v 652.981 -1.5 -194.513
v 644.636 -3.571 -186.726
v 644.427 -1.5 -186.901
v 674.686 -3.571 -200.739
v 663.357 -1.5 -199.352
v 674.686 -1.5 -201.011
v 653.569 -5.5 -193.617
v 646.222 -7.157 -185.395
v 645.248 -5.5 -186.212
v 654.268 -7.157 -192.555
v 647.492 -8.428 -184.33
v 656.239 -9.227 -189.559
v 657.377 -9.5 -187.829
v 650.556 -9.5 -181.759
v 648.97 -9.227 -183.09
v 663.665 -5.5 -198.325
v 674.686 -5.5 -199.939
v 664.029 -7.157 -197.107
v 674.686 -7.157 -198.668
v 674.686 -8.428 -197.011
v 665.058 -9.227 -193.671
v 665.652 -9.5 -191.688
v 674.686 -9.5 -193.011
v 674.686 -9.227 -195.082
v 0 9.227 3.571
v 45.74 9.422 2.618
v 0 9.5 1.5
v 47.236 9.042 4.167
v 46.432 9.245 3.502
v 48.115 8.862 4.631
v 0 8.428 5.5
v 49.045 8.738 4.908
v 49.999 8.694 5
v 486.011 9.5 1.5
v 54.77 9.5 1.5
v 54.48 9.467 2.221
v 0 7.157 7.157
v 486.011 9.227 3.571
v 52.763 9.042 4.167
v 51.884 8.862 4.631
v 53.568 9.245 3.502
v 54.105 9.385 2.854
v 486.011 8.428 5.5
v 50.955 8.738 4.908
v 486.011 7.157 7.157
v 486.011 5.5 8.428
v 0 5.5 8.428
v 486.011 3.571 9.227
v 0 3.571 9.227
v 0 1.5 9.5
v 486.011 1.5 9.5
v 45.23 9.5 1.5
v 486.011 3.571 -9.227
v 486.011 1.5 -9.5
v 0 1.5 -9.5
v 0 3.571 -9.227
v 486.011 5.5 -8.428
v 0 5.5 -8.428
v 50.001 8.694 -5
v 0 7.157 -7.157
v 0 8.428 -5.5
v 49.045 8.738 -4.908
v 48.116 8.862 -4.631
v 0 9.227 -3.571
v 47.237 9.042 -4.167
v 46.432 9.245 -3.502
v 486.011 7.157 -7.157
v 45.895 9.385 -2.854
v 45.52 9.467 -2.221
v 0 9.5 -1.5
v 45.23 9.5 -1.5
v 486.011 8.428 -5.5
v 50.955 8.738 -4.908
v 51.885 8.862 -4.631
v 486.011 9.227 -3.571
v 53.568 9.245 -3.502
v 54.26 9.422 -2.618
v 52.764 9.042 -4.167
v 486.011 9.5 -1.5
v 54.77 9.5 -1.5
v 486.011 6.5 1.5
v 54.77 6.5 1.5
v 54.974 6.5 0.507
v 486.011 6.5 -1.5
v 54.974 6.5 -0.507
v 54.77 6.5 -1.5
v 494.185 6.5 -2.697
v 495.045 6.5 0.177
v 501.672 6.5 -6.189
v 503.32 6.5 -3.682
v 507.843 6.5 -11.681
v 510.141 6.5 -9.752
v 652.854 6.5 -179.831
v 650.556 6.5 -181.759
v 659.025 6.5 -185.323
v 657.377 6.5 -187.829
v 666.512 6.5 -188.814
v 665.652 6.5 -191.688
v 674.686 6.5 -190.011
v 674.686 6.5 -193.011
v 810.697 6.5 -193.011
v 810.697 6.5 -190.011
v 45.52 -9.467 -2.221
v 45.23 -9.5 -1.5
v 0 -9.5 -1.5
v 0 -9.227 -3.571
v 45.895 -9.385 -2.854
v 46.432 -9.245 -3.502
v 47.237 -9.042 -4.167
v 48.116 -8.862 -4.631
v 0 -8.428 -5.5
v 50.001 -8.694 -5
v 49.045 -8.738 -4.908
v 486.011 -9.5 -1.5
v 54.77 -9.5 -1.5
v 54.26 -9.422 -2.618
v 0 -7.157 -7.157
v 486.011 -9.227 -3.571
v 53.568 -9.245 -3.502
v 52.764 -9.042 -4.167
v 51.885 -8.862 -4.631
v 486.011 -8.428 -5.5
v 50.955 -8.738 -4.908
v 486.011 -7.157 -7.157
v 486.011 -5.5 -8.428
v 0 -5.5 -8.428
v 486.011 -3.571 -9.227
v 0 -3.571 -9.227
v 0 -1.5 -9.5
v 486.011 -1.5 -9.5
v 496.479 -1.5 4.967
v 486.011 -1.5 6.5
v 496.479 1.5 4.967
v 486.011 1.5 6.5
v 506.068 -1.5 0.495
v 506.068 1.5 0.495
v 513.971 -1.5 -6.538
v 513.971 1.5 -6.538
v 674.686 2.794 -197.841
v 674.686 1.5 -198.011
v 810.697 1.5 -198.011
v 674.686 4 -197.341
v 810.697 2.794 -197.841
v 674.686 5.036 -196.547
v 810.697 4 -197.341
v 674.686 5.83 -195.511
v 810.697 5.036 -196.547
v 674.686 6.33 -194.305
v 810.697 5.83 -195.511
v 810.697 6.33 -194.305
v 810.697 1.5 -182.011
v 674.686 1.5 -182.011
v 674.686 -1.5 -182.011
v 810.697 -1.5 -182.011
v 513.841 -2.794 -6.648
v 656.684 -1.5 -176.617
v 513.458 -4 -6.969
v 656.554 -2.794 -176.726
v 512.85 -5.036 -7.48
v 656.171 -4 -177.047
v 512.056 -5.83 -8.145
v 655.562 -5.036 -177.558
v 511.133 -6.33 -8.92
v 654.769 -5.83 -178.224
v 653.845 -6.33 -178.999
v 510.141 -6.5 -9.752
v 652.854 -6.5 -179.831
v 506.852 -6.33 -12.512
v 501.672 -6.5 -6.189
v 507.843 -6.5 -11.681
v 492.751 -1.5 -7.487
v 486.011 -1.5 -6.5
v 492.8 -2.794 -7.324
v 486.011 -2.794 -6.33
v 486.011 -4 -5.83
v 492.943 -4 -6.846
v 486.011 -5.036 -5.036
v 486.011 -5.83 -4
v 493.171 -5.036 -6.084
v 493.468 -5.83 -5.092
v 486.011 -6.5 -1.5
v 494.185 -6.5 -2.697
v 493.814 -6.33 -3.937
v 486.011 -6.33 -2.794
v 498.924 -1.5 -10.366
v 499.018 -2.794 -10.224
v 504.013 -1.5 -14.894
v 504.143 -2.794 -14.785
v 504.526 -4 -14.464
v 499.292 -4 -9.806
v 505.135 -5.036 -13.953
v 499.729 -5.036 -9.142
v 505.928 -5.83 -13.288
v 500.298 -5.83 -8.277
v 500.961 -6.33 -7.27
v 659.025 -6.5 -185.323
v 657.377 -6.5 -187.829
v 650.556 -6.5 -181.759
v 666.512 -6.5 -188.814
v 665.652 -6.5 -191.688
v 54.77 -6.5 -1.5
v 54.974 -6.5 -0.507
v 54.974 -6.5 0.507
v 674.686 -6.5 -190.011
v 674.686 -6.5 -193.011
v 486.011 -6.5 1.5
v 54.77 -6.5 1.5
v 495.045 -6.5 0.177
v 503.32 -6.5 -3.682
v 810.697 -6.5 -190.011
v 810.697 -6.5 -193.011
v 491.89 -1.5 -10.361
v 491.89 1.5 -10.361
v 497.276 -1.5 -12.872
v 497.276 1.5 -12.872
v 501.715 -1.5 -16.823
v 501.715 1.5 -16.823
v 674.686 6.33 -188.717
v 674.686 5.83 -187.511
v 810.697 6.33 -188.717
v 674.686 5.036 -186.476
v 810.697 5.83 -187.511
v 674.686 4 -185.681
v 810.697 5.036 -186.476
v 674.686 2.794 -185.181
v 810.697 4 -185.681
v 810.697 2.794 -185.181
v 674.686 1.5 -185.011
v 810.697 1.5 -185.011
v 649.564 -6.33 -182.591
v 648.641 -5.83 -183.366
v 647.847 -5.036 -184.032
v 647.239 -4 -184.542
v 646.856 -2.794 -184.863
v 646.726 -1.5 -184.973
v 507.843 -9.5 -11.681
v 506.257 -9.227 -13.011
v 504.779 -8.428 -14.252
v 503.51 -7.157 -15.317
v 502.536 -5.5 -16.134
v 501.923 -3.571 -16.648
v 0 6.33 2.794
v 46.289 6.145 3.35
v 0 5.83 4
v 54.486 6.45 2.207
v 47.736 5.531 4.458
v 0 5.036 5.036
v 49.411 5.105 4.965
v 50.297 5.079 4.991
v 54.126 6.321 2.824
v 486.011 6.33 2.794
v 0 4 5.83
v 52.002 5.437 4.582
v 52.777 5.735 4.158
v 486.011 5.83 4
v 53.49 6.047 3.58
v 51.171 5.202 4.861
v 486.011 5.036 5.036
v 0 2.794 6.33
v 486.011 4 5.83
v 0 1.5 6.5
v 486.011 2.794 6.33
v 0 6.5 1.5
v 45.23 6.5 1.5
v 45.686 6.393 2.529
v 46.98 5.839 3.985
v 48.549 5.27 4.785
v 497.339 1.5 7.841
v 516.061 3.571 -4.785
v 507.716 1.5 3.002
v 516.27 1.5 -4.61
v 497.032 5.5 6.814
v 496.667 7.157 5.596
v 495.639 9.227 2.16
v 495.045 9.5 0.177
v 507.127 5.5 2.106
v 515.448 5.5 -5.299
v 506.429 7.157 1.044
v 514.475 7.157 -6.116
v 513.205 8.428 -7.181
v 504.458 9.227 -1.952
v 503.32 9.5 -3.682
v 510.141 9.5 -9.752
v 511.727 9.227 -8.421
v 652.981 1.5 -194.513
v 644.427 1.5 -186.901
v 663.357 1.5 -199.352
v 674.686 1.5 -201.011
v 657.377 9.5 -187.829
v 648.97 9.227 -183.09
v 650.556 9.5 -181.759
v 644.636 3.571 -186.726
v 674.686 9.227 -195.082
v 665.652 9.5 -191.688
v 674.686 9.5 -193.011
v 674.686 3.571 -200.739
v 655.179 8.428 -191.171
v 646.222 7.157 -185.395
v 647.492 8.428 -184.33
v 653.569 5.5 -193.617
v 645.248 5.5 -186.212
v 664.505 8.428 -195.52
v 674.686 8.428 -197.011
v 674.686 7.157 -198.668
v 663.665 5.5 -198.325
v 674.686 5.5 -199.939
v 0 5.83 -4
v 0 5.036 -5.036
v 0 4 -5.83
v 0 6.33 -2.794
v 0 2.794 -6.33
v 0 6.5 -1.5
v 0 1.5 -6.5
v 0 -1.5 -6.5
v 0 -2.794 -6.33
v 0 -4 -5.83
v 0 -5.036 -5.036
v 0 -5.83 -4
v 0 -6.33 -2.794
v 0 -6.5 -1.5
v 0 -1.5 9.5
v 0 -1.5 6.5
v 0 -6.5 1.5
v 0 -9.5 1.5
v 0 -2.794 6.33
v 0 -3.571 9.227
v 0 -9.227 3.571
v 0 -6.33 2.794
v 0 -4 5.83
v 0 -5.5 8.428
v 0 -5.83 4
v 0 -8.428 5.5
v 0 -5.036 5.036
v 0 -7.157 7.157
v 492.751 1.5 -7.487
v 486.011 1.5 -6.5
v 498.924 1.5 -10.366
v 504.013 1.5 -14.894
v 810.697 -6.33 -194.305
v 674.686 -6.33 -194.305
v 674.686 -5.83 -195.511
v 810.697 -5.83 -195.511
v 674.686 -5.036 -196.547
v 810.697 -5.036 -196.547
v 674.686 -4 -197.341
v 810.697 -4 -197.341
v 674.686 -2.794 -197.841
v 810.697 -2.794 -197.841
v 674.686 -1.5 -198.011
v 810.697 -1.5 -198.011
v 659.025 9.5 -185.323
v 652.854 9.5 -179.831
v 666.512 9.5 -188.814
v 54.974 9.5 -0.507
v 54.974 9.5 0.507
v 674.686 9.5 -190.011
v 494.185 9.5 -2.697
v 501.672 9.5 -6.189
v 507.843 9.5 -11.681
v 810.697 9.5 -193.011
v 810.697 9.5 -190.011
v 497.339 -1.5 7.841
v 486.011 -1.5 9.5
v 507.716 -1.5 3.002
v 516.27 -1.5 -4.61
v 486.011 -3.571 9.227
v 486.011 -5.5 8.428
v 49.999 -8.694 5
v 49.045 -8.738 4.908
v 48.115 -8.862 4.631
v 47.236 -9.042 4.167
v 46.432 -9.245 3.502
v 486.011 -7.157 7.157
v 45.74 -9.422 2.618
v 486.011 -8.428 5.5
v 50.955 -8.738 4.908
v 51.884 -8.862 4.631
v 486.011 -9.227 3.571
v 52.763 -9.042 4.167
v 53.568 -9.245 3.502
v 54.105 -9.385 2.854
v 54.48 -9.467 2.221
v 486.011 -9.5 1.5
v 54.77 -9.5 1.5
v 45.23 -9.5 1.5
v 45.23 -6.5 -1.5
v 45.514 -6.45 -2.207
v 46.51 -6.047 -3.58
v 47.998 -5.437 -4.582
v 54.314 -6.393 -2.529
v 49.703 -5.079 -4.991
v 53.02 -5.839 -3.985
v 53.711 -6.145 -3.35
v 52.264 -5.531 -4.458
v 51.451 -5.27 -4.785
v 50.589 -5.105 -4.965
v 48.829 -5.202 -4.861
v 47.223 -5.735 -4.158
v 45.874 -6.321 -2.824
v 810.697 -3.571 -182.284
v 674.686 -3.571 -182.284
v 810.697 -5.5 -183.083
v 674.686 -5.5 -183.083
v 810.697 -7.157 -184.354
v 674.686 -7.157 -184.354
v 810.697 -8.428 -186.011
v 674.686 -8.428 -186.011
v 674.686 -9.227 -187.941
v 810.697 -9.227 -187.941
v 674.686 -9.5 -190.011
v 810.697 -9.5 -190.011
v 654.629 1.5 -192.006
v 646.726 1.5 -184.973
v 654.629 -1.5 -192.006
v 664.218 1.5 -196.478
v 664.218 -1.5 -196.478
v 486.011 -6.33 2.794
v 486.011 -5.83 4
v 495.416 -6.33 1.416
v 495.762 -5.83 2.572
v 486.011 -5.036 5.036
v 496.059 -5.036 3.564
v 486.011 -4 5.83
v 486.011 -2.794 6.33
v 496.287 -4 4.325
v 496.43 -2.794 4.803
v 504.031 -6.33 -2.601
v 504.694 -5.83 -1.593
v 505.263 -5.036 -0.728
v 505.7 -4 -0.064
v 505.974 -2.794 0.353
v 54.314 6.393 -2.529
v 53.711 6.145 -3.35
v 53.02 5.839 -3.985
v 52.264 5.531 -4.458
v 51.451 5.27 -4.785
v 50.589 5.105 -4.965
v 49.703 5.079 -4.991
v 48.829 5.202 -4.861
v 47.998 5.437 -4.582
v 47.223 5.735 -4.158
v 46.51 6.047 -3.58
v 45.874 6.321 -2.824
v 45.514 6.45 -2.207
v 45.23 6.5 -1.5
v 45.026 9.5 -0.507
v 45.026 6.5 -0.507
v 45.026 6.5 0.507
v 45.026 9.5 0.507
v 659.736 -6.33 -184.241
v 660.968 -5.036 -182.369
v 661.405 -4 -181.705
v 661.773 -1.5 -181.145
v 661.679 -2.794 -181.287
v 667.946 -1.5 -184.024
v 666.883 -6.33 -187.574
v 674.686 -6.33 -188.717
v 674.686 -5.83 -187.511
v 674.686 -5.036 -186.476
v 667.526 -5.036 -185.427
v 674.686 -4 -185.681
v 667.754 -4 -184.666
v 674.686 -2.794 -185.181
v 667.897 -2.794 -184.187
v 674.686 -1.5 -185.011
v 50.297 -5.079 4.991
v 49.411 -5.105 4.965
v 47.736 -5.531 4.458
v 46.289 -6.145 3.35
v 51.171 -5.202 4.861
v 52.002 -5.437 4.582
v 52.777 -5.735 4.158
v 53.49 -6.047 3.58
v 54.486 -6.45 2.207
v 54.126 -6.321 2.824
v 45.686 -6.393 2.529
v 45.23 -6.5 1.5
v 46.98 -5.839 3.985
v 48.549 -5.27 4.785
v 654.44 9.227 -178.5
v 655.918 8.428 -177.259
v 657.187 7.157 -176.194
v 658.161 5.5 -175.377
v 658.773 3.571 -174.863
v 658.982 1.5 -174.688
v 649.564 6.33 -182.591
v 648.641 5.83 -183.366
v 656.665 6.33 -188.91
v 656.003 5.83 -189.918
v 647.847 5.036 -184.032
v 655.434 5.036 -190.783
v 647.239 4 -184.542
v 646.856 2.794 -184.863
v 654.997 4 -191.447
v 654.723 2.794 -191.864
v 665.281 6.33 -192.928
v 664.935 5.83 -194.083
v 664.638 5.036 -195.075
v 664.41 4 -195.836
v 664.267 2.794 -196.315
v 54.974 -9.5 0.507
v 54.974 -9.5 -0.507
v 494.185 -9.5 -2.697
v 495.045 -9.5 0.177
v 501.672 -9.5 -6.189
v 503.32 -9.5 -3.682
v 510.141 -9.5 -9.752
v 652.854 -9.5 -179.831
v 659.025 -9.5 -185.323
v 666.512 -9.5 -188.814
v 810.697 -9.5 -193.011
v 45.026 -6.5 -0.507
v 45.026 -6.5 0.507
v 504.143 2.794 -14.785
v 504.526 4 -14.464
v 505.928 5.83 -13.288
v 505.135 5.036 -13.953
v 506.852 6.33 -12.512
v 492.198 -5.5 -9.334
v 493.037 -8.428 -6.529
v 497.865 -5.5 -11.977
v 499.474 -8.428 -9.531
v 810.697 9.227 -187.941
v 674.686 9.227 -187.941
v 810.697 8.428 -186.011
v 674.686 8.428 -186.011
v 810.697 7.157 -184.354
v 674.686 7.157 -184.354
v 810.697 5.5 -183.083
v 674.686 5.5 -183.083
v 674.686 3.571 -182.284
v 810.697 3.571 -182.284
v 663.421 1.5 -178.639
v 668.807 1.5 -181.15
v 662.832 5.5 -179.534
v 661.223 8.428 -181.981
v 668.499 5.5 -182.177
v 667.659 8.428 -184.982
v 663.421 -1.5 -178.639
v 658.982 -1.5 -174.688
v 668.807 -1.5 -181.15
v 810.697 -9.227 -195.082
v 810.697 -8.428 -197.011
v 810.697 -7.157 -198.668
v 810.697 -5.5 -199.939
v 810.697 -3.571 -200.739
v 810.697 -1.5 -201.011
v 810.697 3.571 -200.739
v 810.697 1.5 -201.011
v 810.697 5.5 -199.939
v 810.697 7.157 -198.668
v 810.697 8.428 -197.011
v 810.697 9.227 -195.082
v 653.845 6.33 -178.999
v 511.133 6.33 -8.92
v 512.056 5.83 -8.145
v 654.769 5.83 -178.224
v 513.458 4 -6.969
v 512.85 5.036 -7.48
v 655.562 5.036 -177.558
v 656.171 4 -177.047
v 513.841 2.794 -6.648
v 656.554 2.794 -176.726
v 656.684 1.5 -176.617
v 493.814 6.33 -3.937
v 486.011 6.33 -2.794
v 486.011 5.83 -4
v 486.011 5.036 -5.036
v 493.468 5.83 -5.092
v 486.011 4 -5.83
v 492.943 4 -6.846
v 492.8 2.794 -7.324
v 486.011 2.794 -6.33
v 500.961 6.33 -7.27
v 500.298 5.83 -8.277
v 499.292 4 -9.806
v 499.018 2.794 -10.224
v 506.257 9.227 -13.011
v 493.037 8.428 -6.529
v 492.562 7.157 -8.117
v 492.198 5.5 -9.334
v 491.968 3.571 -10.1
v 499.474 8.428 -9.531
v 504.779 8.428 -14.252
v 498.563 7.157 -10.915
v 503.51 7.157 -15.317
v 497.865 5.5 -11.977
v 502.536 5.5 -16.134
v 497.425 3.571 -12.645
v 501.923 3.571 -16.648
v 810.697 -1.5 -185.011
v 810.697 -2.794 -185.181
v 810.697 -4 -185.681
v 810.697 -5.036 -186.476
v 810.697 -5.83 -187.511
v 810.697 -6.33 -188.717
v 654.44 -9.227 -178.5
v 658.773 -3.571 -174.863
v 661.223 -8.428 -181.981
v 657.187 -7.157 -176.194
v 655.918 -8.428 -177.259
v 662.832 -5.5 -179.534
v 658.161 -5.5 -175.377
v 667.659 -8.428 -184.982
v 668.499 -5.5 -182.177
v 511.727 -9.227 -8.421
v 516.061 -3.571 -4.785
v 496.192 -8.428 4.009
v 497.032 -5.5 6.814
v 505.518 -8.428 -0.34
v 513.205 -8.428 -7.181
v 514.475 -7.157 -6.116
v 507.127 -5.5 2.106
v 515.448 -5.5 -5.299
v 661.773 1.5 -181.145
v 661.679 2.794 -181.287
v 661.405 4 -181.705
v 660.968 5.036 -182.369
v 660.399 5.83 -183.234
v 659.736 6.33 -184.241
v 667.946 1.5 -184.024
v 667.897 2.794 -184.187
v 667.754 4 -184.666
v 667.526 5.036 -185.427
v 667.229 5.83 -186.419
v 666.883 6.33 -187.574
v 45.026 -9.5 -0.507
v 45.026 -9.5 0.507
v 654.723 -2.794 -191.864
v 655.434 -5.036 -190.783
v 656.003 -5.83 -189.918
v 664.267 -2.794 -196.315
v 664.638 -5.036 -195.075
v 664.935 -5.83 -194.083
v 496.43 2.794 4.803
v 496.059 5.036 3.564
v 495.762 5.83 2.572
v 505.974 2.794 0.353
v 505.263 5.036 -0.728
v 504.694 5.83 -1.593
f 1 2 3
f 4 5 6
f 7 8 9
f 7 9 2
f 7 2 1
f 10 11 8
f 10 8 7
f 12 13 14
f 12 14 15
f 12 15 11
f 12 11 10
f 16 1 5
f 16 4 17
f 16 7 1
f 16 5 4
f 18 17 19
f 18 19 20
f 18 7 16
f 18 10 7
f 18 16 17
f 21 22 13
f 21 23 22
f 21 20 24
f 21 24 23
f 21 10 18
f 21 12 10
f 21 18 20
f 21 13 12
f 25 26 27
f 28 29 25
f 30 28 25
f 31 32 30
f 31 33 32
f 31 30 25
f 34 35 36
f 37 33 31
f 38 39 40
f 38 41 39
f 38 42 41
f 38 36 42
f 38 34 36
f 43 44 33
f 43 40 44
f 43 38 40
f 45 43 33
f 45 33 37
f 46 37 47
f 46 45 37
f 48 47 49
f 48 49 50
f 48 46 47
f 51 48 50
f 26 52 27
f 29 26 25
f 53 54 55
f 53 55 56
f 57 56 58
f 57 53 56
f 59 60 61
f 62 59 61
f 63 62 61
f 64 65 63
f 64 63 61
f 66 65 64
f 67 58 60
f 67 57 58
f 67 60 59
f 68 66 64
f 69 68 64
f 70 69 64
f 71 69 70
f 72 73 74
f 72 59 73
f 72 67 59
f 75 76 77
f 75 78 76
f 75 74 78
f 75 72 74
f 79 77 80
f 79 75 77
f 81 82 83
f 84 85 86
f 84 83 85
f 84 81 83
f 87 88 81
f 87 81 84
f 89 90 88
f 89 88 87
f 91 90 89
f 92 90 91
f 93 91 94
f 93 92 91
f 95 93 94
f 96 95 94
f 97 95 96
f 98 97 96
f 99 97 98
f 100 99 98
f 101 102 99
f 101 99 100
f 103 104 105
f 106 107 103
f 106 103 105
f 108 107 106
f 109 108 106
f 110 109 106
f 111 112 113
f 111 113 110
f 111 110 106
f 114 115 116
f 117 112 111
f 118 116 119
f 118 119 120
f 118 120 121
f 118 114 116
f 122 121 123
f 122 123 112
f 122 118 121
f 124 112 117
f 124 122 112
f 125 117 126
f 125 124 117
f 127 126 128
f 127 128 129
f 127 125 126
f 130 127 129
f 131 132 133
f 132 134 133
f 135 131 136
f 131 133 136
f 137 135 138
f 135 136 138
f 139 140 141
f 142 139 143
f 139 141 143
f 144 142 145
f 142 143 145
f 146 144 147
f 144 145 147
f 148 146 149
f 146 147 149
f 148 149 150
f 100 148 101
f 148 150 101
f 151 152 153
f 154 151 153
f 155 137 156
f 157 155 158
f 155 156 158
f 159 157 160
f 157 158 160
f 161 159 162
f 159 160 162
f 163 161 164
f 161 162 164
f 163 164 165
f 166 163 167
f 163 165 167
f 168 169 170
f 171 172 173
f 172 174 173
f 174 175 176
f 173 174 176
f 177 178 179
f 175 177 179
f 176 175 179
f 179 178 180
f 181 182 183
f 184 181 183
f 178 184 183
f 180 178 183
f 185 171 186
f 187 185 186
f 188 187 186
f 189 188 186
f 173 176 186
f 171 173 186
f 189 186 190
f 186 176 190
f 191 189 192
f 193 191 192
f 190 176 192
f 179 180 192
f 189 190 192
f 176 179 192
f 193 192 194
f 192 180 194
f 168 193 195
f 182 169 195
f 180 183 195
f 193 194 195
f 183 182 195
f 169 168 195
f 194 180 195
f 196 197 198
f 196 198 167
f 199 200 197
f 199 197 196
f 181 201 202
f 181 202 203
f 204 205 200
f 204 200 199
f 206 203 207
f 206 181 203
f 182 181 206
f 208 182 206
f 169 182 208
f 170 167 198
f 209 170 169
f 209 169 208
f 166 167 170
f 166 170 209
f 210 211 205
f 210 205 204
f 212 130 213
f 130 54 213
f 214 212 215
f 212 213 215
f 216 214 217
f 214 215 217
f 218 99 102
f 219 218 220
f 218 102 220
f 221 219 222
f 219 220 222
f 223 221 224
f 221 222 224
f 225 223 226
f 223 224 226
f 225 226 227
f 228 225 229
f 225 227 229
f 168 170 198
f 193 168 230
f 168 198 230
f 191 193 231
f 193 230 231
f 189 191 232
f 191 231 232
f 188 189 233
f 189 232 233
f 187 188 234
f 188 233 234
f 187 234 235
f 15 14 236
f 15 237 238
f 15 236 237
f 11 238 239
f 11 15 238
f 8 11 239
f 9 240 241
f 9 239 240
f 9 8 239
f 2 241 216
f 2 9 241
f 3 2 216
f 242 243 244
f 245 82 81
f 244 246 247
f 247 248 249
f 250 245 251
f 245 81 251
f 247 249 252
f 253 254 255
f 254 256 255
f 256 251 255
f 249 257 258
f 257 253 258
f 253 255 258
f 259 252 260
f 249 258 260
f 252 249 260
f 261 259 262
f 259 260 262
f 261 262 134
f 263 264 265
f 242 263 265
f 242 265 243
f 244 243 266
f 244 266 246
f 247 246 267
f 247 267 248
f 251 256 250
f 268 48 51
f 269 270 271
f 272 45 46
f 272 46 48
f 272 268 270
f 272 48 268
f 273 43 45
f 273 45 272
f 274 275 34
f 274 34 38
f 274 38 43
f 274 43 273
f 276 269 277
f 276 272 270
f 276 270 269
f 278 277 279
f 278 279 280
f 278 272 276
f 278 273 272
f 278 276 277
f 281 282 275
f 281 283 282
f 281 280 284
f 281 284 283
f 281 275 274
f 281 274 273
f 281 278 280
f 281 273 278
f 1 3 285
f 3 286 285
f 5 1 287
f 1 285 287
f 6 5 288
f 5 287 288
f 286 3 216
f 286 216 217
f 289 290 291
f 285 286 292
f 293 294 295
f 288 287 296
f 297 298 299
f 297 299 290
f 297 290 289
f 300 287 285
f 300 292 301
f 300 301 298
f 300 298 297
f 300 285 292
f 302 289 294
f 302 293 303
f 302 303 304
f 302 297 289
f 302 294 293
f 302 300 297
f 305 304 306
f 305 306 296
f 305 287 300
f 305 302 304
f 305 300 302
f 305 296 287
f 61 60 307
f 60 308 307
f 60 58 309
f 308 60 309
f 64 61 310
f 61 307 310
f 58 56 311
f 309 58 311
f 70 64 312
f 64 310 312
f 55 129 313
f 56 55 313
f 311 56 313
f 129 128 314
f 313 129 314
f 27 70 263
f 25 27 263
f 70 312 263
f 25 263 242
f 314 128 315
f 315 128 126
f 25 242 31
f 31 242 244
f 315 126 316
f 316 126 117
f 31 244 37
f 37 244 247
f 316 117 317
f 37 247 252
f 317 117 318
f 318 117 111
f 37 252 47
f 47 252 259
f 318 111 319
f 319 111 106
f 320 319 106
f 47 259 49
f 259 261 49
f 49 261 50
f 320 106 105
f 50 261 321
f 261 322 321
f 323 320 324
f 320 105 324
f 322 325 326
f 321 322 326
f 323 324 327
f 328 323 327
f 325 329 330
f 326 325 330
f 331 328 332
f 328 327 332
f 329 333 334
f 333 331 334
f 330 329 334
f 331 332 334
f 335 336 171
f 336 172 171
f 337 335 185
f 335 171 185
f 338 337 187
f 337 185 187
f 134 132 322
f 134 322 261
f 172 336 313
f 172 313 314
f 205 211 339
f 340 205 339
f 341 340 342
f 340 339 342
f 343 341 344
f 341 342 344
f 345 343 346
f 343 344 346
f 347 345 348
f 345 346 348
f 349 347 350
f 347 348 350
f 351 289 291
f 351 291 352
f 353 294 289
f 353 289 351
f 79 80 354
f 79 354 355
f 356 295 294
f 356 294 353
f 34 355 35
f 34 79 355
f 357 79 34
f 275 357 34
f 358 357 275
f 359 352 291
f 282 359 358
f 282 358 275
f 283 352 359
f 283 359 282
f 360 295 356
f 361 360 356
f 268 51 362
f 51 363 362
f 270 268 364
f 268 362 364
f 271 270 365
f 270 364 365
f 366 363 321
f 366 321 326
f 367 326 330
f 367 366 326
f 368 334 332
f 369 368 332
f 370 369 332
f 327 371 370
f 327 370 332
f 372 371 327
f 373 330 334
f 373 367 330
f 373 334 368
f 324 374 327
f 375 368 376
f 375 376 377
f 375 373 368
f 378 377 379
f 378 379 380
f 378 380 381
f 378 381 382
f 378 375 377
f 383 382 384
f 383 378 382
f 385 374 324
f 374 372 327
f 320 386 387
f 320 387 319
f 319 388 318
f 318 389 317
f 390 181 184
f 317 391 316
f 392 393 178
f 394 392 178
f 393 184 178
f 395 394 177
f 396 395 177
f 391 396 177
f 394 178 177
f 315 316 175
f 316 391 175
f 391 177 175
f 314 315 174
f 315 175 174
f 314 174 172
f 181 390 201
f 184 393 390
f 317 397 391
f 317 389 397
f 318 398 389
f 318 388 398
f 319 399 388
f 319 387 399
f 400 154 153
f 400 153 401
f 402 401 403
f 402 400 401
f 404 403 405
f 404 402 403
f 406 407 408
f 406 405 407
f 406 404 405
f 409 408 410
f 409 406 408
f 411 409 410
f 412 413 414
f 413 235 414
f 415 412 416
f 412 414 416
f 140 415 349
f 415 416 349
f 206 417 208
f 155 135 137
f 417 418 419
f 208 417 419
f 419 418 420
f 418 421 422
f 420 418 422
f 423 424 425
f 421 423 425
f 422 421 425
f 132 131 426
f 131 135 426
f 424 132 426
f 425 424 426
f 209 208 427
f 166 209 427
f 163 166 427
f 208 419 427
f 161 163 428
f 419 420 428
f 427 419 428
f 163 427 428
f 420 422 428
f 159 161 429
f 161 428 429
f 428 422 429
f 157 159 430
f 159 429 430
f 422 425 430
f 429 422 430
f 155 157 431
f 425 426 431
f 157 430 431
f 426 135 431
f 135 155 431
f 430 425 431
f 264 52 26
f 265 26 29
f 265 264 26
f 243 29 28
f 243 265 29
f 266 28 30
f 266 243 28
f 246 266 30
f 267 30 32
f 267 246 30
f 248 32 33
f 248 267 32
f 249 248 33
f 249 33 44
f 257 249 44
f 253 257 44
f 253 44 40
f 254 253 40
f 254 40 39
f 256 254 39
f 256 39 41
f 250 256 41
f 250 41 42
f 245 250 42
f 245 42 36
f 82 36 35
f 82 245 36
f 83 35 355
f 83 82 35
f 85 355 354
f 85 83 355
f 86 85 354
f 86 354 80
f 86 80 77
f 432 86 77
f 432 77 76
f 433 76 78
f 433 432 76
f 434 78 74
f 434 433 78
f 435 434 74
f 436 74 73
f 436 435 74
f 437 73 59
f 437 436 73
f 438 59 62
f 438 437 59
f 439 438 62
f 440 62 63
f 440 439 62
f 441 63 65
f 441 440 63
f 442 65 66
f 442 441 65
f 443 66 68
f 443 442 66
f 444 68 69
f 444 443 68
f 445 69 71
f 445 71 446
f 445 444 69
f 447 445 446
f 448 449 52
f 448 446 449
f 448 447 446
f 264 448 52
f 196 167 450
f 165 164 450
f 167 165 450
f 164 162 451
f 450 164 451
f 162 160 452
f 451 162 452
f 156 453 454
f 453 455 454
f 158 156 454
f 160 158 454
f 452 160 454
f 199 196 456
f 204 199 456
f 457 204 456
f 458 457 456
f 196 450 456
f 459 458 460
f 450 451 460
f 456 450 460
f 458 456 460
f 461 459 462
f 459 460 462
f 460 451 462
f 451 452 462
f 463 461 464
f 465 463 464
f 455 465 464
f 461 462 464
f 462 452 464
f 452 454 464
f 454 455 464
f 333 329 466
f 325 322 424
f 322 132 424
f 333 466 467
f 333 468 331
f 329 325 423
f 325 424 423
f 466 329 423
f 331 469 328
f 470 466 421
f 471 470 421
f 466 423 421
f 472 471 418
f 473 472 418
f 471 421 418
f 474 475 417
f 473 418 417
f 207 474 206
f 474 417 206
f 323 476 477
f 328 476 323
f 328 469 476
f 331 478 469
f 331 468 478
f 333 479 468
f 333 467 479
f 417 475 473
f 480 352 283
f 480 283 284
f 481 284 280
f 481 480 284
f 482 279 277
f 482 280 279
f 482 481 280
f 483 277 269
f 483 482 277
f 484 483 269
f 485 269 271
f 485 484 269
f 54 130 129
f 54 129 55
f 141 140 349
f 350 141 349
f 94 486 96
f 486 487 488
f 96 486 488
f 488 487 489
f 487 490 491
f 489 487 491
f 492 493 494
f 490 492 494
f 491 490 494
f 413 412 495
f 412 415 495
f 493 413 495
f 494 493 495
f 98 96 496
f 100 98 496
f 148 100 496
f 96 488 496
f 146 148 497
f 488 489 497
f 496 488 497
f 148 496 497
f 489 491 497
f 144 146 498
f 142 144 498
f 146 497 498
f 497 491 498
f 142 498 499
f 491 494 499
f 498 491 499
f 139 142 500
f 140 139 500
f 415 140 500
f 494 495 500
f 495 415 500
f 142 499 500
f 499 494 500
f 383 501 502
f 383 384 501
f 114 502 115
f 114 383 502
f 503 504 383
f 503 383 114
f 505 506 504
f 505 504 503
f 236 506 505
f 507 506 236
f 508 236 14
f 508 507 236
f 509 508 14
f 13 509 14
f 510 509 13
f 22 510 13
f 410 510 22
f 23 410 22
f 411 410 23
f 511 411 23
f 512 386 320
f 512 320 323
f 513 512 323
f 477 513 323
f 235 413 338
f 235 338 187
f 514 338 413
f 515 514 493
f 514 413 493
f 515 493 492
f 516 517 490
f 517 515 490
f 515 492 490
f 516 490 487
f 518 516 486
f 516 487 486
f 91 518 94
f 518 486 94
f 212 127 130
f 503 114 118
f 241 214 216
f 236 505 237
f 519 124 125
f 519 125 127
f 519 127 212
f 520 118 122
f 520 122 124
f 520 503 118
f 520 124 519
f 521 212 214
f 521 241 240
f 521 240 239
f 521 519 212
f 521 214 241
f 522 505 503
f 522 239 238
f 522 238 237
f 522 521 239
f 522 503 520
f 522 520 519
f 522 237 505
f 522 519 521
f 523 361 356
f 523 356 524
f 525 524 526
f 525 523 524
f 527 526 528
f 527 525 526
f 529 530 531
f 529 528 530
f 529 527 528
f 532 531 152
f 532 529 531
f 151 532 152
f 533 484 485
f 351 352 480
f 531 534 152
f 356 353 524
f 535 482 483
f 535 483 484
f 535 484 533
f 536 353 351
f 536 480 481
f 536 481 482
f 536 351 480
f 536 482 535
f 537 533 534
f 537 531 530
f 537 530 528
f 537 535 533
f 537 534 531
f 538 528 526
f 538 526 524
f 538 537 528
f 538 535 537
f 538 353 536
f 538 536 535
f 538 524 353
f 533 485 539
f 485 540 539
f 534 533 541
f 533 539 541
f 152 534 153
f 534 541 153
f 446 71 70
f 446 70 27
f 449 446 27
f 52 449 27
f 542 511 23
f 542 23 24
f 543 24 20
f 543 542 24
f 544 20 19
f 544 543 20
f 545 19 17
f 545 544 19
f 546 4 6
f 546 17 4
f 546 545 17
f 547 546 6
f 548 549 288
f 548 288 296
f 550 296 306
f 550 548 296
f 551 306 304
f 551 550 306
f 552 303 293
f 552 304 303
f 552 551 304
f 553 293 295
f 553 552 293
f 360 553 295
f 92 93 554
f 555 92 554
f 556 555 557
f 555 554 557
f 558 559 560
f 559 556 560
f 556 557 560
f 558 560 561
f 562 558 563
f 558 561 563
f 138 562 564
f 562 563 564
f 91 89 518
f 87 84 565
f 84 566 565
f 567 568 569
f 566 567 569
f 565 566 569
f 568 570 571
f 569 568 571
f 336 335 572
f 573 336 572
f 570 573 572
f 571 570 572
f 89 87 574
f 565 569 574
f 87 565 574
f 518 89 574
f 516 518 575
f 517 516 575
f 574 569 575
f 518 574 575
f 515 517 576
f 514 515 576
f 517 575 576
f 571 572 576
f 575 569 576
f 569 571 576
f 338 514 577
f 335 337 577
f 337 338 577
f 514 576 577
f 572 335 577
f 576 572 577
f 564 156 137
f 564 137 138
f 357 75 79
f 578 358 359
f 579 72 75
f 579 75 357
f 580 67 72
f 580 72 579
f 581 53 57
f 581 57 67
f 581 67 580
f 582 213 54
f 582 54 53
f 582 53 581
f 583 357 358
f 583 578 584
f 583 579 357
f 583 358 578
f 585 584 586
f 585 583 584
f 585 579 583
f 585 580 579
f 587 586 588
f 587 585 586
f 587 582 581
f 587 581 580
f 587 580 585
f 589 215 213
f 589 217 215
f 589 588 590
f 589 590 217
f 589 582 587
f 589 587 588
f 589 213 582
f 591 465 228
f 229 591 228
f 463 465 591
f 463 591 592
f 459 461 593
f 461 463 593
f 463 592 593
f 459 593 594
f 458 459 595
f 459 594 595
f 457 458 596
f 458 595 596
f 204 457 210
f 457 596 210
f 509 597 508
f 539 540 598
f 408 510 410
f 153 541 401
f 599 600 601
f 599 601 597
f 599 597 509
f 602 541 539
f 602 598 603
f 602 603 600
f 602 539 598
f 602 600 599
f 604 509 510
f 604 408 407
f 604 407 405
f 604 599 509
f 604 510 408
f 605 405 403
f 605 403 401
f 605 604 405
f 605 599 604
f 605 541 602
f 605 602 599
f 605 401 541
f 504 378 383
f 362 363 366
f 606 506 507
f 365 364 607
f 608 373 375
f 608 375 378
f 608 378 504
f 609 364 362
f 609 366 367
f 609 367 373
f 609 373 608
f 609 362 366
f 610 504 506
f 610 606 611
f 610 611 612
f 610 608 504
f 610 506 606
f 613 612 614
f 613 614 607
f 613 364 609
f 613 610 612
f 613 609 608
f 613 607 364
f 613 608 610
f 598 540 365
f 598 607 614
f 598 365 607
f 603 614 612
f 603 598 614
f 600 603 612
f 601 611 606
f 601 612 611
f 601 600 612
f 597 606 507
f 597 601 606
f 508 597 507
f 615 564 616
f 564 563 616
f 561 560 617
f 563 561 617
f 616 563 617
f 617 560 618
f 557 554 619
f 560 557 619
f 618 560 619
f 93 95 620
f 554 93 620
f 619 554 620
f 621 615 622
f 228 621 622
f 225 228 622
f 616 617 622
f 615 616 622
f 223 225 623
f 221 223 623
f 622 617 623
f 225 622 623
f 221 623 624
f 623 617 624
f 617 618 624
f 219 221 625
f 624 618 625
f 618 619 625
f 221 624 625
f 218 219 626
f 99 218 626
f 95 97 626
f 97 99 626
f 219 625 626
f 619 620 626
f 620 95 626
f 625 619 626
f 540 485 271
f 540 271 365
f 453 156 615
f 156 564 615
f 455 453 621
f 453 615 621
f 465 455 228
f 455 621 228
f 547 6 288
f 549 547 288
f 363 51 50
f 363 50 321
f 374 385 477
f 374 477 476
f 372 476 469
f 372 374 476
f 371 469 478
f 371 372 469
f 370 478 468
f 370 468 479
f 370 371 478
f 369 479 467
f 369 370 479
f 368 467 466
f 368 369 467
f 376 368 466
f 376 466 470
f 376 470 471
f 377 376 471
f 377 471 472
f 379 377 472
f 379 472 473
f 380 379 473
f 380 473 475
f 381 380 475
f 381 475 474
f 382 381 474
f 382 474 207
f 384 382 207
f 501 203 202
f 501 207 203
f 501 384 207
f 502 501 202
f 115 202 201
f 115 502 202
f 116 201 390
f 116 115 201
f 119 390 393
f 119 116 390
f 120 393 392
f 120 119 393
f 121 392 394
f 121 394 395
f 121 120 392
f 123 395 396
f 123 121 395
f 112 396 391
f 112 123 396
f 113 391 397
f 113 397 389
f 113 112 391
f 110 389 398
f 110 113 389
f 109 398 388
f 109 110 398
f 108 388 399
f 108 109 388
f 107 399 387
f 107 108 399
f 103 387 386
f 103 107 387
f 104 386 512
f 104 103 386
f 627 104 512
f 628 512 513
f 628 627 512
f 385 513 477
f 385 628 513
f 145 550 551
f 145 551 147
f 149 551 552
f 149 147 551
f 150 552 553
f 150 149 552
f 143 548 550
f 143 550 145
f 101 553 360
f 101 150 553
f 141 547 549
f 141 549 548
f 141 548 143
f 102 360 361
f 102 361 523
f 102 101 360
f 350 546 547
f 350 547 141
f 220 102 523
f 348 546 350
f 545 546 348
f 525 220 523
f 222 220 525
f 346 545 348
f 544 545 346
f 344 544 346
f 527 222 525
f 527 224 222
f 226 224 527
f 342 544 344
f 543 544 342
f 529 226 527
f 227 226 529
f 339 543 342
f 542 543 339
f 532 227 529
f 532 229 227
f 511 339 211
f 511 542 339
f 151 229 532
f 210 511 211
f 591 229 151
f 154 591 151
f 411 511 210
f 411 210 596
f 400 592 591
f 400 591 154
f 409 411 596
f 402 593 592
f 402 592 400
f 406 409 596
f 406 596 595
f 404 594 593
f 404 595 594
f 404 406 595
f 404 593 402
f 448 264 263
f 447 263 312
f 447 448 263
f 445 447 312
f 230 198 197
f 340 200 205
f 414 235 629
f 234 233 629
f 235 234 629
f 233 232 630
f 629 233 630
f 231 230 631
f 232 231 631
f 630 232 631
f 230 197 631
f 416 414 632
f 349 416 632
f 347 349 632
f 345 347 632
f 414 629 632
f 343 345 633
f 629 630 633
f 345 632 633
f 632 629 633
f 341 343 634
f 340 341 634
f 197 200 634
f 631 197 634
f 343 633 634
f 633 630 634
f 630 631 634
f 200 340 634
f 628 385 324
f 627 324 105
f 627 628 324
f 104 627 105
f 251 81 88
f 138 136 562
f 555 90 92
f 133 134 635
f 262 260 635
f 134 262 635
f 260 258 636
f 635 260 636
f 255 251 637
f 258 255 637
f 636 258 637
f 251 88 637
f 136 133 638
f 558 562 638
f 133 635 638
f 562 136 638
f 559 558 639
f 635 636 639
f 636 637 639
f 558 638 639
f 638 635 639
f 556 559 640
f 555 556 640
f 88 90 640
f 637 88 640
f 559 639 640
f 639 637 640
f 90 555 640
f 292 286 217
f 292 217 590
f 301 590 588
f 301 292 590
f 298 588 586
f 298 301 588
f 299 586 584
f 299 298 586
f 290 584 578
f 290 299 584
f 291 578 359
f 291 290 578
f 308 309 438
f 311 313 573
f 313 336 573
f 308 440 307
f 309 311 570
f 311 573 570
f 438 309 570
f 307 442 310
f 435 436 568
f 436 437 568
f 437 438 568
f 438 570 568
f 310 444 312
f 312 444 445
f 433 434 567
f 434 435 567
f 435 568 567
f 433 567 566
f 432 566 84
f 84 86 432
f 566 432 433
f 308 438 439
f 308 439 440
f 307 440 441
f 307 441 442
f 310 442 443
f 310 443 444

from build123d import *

# Parameters (mm, degrees)
CUT_EXTRUDE3_DEPTH      = 836.299457856
CUT_EXTRUDE3_DEPTH_BACK = 836.299457856
SKETCH21_R              = 5


with BuildPart() as part:
    # Sweep-Thin3: sweep along a curve in space
    with BuildLine() as sweep_thin3_path:
        Line((674.686132166, 0, -191.51111078), (810.696902422, 0, -191.51111078))
        ThreePointArc((651.704798873, 0, -180.79473907), (662.007584314, 0, -188.700344391), (674.686132166, 0, -191.51111078))
        Line((508.992103549, 0, -10.716371709), (651.704798873, 0, -180.79473907))
        ThreePointArc((486.010770255, 0, 0), (498.689318108, 0, -2.810766389), (508.992103549, 0, -10.716371709))
        Line((0, 0, 0), (486.010770255, 0, 0))
    # Sketch2 → Sweep-Thin3 (sweep)
    with BuildSketch(Plane(origin=(0, 0, 0), x_dir=(0, 0, -1), z_dir=(1, 0, 0))):
        with BuildLine():
            Line((1.5, 9.5), (-1.5, 9.5))
            ThreePointArc((-1.5, 9.5), (-7.156854249, 7.156854249), (-9.5, 1.5))
            Line((-9.5, 1.5), (-9.5, -1.5))
            ThreePointArc((-9.5, -1.5), (-7.156854249, -7.156854249), (-1.5, -9.5))
            Line((-1.5, -9.5), (1.5, -9.5))
            ThreePointArc((1.5, -9.5), (7.156854249, -7.156854249), (9.5, -1.5))
            Line((9.5, -1.5), (9.5, 1.5))
            ThreePointArc((9.5, 1.5), (7.156854249, 7.156854249), (1.5, 9.5))
        make_face()
        with BuildLine():
            Line((1.5, 6.5), (-1.5, 6.5))
            ThreePointArc((-1.5, 6.5), (-5.035533906, 5.035533906), (-6.5, 1.5))
            Line((-6.5, 1.5), (-6.5, -1.5))
            ThreePointArc((-6.5, -1.5), (-5.035533906, -5.035533906), (-1.5, -6.5))
            Line((-1.5, -6.5), (1.5, -6.5))
            ThreePointArc((1.5, -6.5), (5.035533906, -5.035533906), (6.5, -1.5))
            Line((6.5, -1.5), (6.5, 1.5))
            ThreePointArc((6.5, 1.5), (5.035533906, 5.035533906), (1.5, 6.5))
        make_face(mode=Mode.SUBTRACT)
    sweep(path=sweep_thin3_path.line)

    # Sketch21 → Cut-Extrude3 (cut, two sides: drawn at the far end of the back side and taken through both)
    with BuildSketch(Plane(origin=(0, 0, 0), x_dir=(1, 0, 0), z_dir=(0, 1, 0)).offset(-CUT_EXTRUDE3_DEPTH_BACK)):
        with Locations(Location((50, 0, 0), (0, 0, 197.457603124))):
            Circle(SKETCH21_R)
    extrude(amount=CUT_EXTRUDE3_DEPTH + CUT_EXTRUDE3_DEPTH_BACK, mode=Mode.SUBTRACT)


solid = part.part
